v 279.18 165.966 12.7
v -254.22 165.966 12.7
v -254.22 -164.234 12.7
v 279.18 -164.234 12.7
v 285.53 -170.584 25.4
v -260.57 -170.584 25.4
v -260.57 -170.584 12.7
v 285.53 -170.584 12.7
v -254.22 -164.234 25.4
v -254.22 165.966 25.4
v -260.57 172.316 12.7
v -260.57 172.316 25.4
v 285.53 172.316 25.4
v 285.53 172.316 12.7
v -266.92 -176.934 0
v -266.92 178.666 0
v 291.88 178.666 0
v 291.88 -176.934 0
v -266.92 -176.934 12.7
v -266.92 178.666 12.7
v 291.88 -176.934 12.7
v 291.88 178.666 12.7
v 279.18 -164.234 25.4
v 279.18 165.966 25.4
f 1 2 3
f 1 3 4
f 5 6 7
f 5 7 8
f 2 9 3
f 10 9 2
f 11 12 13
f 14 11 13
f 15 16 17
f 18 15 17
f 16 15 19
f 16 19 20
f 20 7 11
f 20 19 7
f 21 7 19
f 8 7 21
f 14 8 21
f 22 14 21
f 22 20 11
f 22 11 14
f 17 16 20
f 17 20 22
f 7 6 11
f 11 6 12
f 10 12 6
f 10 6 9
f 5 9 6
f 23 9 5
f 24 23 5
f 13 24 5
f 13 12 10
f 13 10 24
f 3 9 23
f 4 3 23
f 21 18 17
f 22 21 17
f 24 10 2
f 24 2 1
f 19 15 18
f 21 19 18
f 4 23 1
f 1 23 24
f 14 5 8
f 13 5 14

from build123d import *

# Parameters (mm, degrees)
F0_W     = 558.8
F0_H     = 355.6
F1_DEPTH = 25.4
F2_W     = 533.4
F2_H     = 330.2
F3_DEPTH = 12.7
F4_W     = 558.8
F4_H     = 355.6
F4_W_2   = 546.1
F4_H_2   = 342.9
F5_DEPTH = 12.7


with BuildPart() as f1:
    # F0 (on Top) → F1 (new body)
    with BuildSketch(Plane.XY):
        with Locations((12.479961, 0.865745)):
            Rectangle(F0_W, F0_H)
    extrude(amount=F1_DEPTH)

    # F2 (on face) → F3 (cut)
    with BuildSketch(Plane.XY.offset(25.4)):
        with Locations((12.479961, 0.865745)):
            Rectangle(F2_W, F2_H)
    extrude(amount=-F3_DEPTH, mode=Mode.SUBTRACT)

    # F4 (on face) → F5 (cut)
    with BuildSketch(Plane.XY.offset(25.4)):
        with Locations((12.479961, 0.865745)):
            Rectangle(F4_W, F4_H)
        with Locations((12.479961, 0.865745)):
            Rectangle(F4_W_2, F4_H_2, mode=Mode.SUBTRACT)
    extrude(amount=-F5_DEPTH, mode=Mode.SUBTRACT)


solid = f1.part
